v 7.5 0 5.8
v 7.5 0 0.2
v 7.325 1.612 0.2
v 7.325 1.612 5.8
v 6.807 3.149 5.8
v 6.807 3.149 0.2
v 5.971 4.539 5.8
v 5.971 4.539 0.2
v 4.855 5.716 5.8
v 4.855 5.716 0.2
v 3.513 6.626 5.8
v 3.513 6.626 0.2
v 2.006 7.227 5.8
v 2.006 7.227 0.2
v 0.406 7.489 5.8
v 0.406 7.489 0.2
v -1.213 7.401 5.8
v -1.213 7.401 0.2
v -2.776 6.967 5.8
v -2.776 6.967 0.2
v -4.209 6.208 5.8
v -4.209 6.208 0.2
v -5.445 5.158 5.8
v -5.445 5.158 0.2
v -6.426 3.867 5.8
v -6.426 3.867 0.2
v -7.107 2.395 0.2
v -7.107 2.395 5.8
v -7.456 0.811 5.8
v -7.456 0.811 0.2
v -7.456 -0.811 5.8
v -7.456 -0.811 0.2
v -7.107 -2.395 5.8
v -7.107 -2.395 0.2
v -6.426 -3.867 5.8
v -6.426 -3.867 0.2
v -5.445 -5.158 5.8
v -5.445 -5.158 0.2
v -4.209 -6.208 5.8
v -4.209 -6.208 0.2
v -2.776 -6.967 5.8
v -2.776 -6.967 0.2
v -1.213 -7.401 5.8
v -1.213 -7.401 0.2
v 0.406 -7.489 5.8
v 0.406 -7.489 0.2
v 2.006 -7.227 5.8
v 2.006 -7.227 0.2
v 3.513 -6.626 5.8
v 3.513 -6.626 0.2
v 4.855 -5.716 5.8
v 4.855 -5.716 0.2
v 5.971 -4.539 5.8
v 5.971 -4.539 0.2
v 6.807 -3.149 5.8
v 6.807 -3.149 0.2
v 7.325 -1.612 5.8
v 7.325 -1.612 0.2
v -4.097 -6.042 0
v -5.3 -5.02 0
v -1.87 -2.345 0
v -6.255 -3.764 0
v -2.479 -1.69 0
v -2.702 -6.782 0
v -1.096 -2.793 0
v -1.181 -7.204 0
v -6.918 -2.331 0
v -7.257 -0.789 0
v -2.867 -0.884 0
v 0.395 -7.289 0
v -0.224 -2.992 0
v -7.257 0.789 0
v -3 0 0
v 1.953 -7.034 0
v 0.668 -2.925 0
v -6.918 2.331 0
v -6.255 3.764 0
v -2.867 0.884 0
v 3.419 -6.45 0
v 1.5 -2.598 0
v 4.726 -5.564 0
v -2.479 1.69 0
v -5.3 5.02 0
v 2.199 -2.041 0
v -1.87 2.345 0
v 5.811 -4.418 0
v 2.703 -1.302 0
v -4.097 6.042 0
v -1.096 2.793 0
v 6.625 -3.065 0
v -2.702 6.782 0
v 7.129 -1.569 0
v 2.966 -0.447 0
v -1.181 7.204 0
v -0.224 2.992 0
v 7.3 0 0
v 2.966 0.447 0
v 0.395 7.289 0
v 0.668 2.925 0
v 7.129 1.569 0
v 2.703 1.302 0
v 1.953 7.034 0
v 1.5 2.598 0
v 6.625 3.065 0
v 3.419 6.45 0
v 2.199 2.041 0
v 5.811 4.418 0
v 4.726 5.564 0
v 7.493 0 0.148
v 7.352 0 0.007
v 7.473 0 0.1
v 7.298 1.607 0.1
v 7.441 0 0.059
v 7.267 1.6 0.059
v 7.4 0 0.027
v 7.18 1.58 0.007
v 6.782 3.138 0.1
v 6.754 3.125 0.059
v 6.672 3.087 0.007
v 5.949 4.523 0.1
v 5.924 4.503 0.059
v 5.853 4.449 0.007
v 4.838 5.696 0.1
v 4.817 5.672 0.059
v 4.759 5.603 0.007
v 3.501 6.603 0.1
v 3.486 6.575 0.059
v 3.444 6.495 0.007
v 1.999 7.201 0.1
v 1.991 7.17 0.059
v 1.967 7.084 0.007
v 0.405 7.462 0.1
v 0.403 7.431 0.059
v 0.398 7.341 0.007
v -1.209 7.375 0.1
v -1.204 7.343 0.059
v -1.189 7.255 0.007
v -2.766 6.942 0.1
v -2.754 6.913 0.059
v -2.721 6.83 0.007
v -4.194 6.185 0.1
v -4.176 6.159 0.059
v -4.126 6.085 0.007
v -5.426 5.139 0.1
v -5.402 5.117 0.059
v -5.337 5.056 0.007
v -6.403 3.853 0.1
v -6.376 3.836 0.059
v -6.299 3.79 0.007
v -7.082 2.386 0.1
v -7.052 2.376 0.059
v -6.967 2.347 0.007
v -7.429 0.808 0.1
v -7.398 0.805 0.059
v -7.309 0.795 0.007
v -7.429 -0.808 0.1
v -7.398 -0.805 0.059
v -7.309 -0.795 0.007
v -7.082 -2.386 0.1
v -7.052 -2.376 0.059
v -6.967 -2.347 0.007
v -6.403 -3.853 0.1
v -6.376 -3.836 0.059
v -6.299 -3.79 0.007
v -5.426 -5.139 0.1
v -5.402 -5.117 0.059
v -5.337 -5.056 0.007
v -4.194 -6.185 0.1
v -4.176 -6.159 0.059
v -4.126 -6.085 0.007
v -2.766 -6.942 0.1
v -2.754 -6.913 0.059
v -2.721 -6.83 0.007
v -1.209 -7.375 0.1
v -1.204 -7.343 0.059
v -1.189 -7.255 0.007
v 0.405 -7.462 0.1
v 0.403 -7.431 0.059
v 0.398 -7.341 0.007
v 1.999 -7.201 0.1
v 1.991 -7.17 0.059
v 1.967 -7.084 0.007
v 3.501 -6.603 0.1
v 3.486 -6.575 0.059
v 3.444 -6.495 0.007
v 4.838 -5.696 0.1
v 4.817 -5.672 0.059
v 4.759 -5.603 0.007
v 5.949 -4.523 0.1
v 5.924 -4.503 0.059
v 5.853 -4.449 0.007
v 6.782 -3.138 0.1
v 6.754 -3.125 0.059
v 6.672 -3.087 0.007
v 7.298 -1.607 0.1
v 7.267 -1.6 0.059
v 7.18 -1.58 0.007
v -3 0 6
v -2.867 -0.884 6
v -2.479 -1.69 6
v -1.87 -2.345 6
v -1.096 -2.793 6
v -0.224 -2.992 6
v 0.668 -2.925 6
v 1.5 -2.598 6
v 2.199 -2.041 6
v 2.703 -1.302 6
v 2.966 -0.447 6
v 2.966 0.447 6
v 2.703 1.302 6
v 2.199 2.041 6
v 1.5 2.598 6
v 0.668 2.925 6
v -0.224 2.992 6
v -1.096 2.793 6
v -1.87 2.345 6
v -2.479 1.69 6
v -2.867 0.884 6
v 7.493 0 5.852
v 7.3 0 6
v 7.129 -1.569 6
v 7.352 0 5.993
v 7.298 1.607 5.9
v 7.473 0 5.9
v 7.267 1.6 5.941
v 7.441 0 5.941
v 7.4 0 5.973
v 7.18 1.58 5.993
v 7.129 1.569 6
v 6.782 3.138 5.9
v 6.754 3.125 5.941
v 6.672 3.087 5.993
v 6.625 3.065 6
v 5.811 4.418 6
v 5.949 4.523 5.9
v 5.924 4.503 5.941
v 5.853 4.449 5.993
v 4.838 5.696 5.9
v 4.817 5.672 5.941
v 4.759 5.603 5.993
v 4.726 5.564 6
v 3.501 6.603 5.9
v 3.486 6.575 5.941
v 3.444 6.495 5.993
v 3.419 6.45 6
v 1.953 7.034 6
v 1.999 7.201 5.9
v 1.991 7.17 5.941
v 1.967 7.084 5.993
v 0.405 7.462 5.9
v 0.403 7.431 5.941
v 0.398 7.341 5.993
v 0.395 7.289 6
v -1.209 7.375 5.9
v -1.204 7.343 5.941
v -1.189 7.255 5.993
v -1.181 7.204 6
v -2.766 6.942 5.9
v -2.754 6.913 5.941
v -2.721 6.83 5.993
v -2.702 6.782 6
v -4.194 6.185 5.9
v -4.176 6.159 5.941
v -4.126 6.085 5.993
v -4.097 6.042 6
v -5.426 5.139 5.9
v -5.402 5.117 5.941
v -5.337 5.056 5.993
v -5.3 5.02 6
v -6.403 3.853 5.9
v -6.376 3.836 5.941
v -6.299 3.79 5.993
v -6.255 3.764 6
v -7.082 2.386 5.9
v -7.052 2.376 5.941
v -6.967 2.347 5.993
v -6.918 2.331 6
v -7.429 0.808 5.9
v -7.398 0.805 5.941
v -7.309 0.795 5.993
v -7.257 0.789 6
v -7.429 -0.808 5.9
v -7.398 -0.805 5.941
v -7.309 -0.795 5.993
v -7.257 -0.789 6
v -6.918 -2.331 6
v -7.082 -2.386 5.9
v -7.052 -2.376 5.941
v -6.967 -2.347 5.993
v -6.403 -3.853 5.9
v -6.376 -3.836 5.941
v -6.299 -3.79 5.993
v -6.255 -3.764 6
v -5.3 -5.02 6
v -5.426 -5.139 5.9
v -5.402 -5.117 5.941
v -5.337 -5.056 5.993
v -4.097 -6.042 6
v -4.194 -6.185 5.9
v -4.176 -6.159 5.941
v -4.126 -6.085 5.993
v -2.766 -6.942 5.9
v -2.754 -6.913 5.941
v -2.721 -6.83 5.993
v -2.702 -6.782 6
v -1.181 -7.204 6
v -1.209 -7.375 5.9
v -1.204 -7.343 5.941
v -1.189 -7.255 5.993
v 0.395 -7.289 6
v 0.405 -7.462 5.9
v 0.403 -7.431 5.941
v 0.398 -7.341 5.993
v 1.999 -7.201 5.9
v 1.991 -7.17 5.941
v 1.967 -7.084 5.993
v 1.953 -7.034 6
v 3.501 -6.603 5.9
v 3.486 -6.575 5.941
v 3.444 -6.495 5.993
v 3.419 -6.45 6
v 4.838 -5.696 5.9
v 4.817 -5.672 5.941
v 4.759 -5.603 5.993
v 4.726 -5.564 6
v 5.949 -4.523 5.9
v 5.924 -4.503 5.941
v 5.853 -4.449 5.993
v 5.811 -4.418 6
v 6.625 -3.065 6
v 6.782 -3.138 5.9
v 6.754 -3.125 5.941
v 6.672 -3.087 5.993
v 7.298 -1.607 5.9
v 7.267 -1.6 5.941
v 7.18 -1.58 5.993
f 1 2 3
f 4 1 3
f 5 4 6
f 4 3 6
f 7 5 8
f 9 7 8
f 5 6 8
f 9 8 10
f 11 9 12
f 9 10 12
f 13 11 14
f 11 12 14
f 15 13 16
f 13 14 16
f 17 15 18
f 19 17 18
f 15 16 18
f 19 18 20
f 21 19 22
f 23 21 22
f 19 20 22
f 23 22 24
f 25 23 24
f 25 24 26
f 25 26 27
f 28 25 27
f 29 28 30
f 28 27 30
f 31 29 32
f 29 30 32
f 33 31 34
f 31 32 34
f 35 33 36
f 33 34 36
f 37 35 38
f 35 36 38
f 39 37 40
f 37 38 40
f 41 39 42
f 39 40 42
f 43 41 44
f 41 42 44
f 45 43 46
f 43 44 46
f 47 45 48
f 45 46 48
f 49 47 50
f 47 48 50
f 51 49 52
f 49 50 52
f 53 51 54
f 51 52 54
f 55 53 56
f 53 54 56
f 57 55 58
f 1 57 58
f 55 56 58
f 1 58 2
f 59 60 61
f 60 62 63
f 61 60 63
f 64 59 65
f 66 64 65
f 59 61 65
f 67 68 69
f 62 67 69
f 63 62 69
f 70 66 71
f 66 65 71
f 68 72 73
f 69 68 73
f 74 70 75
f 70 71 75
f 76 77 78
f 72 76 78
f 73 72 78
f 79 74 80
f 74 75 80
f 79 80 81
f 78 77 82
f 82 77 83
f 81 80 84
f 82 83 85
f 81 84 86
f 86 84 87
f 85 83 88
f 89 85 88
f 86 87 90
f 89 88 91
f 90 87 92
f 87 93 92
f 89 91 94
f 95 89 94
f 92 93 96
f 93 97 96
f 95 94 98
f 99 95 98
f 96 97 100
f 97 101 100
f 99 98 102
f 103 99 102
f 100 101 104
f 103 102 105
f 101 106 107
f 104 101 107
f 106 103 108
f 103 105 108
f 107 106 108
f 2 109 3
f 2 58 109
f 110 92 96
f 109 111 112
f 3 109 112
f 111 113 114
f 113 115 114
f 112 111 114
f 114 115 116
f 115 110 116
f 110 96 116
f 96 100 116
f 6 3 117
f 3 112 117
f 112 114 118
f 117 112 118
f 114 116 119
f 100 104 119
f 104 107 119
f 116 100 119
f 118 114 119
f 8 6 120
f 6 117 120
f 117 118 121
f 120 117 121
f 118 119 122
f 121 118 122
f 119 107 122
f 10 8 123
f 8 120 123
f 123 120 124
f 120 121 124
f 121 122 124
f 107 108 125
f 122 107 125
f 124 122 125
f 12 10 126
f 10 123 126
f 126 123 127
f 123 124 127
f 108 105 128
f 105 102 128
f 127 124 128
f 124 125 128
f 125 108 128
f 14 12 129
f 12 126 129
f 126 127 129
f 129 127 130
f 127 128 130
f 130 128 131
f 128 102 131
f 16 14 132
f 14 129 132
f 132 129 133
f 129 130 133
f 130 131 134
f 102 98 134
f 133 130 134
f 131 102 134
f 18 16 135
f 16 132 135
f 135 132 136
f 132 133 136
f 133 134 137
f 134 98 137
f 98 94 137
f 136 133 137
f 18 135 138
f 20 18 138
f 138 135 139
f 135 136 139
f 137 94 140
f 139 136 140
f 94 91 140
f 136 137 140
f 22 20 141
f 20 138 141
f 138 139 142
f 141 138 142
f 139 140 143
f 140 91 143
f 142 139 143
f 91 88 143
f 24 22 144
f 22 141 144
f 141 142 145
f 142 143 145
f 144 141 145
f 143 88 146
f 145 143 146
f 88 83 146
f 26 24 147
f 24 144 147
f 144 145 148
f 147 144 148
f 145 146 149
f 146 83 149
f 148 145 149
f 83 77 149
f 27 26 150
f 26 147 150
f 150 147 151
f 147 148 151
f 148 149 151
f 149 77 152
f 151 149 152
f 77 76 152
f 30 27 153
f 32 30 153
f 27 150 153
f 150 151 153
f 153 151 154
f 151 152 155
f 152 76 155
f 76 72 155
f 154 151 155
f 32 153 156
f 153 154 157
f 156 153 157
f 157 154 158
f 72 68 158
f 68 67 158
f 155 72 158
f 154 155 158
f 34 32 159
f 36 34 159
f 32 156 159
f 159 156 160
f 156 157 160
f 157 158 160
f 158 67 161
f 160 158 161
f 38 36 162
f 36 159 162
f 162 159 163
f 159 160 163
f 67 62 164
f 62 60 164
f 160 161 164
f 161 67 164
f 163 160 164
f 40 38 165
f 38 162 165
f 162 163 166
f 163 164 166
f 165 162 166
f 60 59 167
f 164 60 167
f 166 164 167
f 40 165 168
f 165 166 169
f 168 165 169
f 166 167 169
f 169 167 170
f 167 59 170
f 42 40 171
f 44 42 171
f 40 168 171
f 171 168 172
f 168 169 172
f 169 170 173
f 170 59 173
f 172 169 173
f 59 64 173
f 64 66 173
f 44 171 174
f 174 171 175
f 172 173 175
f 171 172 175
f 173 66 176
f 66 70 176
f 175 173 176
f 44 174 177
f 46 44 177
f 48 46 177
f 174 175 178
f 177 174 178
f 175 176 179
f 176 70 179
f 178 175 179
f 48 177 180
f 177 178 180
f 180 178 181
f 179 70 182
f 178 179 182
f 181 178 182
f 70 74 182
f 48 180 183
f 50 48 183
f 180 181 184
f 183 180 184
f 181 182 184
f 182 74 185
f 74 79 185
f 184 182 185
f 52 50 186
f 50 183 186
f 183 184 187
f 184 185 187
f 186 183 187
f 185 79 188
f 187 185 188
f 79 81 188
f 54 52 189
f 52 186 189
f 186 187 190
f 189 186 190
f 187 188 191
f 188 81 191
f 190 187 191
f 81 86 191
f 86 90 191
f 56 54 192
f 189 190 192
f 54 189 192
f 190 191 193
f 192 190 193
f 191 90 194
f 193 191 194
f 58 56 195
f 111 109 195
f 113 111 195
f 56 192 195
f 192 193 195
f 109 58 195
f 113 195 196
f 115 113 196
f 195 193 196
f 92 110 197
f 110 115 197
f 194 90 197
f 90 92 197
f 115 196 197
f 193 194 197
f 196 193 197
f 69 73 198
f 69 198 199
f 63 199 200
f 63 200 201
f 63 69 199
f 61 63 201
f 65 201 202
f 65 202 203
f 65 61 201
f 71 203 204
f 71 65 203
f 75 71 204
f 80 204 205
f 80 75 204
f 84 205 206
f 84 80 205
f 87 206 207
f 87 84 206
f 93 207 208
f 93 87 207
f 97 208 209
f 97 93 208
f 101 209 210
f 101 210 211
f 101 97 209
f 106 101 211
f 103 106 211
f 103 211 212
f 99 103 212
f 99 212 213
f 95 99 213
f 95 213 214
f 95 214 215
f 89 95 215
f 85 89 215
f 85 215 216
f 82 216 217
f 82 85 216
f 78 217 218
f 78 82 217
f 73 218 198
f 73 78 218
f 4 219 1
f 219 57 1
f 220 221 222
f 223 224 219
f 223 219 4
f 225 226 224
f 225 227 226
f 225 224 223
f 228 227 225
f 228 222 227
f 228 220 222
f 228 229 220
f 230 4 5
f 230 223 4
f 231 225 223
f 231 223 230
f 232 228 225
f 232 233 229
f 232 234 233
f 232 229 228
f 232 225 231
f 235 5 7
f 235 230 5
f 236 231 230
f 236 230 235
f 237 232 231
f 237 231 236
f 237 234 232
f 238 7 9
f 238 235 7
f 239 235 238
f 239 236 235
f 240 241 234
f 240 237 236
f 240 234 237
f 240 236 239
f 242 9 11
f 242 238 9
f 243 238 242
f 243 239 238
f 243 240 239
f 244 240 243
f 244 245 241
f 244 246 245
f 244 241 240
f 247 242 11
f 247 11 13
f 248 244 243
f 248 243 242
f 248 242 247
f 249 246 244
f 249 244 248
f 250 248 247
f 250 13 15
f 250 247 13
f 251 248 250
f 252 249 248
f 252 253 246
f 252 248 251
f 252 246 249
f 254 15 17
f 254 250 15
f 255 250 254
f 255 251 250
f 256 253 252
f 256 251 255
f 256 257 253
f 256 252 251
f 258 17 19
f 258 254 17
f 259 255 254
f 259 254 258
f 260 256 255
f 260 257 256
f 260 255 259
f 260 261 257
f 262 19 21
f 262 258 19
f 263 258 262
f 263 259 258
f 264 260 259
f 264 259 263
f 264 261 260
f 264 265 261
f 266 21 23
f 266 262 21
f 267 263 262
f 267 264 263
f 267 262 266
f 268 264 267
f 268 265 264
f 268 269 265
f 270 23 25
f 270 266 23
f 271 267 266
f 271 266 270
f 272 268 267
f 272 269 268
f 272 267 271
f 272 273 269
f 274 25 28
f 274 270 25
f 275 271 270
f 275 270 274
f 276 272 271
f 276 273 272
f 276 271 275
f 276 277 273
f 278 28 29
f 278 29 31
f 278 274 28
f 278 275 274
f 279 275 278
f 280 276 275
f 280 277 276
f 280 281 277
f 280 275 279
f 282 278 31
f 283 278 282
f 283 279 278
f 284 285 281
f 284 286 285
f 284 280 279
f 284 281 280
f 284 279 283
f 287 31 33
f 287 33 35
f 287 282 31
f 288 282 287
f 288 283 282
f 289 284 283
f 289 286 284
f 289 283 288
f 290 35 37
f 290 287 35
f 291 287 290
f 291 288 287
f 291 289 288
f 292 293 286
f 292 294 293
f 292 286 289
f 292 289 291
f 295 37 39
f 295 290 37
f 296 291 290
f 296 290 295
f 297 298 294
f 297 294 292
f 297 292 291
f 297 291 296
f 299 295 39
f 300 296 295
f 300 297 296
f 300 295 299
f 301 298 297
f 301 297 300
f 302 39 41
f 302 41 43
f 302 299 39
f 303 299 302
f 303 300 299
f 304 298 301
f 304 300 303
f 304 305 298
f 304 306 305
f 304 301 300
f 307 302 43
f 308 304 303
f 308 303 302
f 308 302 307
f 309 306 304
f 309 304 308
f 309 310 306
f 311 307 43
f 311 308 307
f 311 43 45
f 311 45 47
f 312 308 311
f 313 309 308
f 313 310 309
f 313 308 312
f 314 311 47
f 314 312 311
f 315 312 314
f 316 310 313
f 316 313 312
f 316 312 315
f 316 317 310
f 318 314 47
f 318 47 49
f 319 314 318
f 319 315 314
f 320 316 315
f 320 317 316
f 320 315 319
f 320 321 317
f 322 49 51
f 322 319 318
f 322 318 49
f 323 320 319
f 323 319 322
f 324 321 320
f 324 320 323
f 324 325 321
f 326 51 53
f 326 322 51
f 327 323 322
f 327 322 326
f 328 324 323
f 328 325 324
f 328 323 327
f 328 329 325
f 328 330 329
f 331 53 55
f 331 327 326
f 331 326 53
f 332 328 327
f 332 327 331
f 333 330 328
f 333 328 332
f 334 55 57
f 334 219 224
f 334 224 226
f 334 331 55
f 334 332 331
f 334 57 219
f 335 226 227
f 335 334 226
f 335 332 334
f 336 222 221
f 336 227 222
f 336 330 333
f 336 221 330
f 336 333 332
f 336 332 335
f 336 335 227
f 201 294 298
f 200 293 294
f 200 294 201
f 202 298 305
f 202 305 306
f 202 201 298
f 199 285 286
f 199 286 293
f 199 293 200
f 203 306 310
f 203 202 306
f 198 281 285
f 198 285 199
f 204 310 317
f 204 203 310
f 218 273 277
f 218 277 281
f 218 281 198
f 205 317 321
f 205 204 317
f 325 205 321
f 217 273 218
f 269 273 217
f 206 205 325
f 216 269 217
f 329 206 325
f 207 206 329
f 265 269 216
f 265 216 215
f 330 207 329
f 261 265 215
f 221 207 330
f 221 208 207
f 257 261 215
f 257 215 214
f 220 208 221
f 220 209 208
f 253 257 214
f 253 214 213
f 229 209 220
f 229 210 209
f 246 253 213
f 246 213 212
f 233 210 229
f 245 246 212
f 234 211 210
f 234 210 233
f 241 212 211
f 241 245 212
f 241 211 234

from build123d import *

# Parameters (mm, degrees)
SKETCH1_R           = 7.5
BOSS_EXTRUDE1_DEPTH = 6
SKETCH2_R           = 3
CUT_EXTRUDE1_DEPTH  = 6
FILLET1_R           = 0.2


with BuildPart() as part:
    # Sketch1 → Boss-Extrude1 (new body)
    with BuildSketch(Plane.XY):
        Circle(SKETCH1_R)
    extrude(amount=BOSS_EXTRUDE1_DEPTH)

    # Sketch2 → Cut-Extrude1 (cut)
    with BuildSketch(Plane.XY):
        with Locations(Location((0, 0, 0), (0, 0, 180))):
            Circle(SKETCH2_R)
    extrude(amount=CUT_EXTRUDE1_DEPTH, mode=Mode.SUBTRACT)

    # Fillet1
    fillet1_edges = [part.edges().sort_by_distance(p)[0] for p in [
        (-7.5, 0, 0),
        (-7.5, 0, 6),
    ]]
    fillet(fillet1_edges, radius=FILLET1_R)


solid = part.part
